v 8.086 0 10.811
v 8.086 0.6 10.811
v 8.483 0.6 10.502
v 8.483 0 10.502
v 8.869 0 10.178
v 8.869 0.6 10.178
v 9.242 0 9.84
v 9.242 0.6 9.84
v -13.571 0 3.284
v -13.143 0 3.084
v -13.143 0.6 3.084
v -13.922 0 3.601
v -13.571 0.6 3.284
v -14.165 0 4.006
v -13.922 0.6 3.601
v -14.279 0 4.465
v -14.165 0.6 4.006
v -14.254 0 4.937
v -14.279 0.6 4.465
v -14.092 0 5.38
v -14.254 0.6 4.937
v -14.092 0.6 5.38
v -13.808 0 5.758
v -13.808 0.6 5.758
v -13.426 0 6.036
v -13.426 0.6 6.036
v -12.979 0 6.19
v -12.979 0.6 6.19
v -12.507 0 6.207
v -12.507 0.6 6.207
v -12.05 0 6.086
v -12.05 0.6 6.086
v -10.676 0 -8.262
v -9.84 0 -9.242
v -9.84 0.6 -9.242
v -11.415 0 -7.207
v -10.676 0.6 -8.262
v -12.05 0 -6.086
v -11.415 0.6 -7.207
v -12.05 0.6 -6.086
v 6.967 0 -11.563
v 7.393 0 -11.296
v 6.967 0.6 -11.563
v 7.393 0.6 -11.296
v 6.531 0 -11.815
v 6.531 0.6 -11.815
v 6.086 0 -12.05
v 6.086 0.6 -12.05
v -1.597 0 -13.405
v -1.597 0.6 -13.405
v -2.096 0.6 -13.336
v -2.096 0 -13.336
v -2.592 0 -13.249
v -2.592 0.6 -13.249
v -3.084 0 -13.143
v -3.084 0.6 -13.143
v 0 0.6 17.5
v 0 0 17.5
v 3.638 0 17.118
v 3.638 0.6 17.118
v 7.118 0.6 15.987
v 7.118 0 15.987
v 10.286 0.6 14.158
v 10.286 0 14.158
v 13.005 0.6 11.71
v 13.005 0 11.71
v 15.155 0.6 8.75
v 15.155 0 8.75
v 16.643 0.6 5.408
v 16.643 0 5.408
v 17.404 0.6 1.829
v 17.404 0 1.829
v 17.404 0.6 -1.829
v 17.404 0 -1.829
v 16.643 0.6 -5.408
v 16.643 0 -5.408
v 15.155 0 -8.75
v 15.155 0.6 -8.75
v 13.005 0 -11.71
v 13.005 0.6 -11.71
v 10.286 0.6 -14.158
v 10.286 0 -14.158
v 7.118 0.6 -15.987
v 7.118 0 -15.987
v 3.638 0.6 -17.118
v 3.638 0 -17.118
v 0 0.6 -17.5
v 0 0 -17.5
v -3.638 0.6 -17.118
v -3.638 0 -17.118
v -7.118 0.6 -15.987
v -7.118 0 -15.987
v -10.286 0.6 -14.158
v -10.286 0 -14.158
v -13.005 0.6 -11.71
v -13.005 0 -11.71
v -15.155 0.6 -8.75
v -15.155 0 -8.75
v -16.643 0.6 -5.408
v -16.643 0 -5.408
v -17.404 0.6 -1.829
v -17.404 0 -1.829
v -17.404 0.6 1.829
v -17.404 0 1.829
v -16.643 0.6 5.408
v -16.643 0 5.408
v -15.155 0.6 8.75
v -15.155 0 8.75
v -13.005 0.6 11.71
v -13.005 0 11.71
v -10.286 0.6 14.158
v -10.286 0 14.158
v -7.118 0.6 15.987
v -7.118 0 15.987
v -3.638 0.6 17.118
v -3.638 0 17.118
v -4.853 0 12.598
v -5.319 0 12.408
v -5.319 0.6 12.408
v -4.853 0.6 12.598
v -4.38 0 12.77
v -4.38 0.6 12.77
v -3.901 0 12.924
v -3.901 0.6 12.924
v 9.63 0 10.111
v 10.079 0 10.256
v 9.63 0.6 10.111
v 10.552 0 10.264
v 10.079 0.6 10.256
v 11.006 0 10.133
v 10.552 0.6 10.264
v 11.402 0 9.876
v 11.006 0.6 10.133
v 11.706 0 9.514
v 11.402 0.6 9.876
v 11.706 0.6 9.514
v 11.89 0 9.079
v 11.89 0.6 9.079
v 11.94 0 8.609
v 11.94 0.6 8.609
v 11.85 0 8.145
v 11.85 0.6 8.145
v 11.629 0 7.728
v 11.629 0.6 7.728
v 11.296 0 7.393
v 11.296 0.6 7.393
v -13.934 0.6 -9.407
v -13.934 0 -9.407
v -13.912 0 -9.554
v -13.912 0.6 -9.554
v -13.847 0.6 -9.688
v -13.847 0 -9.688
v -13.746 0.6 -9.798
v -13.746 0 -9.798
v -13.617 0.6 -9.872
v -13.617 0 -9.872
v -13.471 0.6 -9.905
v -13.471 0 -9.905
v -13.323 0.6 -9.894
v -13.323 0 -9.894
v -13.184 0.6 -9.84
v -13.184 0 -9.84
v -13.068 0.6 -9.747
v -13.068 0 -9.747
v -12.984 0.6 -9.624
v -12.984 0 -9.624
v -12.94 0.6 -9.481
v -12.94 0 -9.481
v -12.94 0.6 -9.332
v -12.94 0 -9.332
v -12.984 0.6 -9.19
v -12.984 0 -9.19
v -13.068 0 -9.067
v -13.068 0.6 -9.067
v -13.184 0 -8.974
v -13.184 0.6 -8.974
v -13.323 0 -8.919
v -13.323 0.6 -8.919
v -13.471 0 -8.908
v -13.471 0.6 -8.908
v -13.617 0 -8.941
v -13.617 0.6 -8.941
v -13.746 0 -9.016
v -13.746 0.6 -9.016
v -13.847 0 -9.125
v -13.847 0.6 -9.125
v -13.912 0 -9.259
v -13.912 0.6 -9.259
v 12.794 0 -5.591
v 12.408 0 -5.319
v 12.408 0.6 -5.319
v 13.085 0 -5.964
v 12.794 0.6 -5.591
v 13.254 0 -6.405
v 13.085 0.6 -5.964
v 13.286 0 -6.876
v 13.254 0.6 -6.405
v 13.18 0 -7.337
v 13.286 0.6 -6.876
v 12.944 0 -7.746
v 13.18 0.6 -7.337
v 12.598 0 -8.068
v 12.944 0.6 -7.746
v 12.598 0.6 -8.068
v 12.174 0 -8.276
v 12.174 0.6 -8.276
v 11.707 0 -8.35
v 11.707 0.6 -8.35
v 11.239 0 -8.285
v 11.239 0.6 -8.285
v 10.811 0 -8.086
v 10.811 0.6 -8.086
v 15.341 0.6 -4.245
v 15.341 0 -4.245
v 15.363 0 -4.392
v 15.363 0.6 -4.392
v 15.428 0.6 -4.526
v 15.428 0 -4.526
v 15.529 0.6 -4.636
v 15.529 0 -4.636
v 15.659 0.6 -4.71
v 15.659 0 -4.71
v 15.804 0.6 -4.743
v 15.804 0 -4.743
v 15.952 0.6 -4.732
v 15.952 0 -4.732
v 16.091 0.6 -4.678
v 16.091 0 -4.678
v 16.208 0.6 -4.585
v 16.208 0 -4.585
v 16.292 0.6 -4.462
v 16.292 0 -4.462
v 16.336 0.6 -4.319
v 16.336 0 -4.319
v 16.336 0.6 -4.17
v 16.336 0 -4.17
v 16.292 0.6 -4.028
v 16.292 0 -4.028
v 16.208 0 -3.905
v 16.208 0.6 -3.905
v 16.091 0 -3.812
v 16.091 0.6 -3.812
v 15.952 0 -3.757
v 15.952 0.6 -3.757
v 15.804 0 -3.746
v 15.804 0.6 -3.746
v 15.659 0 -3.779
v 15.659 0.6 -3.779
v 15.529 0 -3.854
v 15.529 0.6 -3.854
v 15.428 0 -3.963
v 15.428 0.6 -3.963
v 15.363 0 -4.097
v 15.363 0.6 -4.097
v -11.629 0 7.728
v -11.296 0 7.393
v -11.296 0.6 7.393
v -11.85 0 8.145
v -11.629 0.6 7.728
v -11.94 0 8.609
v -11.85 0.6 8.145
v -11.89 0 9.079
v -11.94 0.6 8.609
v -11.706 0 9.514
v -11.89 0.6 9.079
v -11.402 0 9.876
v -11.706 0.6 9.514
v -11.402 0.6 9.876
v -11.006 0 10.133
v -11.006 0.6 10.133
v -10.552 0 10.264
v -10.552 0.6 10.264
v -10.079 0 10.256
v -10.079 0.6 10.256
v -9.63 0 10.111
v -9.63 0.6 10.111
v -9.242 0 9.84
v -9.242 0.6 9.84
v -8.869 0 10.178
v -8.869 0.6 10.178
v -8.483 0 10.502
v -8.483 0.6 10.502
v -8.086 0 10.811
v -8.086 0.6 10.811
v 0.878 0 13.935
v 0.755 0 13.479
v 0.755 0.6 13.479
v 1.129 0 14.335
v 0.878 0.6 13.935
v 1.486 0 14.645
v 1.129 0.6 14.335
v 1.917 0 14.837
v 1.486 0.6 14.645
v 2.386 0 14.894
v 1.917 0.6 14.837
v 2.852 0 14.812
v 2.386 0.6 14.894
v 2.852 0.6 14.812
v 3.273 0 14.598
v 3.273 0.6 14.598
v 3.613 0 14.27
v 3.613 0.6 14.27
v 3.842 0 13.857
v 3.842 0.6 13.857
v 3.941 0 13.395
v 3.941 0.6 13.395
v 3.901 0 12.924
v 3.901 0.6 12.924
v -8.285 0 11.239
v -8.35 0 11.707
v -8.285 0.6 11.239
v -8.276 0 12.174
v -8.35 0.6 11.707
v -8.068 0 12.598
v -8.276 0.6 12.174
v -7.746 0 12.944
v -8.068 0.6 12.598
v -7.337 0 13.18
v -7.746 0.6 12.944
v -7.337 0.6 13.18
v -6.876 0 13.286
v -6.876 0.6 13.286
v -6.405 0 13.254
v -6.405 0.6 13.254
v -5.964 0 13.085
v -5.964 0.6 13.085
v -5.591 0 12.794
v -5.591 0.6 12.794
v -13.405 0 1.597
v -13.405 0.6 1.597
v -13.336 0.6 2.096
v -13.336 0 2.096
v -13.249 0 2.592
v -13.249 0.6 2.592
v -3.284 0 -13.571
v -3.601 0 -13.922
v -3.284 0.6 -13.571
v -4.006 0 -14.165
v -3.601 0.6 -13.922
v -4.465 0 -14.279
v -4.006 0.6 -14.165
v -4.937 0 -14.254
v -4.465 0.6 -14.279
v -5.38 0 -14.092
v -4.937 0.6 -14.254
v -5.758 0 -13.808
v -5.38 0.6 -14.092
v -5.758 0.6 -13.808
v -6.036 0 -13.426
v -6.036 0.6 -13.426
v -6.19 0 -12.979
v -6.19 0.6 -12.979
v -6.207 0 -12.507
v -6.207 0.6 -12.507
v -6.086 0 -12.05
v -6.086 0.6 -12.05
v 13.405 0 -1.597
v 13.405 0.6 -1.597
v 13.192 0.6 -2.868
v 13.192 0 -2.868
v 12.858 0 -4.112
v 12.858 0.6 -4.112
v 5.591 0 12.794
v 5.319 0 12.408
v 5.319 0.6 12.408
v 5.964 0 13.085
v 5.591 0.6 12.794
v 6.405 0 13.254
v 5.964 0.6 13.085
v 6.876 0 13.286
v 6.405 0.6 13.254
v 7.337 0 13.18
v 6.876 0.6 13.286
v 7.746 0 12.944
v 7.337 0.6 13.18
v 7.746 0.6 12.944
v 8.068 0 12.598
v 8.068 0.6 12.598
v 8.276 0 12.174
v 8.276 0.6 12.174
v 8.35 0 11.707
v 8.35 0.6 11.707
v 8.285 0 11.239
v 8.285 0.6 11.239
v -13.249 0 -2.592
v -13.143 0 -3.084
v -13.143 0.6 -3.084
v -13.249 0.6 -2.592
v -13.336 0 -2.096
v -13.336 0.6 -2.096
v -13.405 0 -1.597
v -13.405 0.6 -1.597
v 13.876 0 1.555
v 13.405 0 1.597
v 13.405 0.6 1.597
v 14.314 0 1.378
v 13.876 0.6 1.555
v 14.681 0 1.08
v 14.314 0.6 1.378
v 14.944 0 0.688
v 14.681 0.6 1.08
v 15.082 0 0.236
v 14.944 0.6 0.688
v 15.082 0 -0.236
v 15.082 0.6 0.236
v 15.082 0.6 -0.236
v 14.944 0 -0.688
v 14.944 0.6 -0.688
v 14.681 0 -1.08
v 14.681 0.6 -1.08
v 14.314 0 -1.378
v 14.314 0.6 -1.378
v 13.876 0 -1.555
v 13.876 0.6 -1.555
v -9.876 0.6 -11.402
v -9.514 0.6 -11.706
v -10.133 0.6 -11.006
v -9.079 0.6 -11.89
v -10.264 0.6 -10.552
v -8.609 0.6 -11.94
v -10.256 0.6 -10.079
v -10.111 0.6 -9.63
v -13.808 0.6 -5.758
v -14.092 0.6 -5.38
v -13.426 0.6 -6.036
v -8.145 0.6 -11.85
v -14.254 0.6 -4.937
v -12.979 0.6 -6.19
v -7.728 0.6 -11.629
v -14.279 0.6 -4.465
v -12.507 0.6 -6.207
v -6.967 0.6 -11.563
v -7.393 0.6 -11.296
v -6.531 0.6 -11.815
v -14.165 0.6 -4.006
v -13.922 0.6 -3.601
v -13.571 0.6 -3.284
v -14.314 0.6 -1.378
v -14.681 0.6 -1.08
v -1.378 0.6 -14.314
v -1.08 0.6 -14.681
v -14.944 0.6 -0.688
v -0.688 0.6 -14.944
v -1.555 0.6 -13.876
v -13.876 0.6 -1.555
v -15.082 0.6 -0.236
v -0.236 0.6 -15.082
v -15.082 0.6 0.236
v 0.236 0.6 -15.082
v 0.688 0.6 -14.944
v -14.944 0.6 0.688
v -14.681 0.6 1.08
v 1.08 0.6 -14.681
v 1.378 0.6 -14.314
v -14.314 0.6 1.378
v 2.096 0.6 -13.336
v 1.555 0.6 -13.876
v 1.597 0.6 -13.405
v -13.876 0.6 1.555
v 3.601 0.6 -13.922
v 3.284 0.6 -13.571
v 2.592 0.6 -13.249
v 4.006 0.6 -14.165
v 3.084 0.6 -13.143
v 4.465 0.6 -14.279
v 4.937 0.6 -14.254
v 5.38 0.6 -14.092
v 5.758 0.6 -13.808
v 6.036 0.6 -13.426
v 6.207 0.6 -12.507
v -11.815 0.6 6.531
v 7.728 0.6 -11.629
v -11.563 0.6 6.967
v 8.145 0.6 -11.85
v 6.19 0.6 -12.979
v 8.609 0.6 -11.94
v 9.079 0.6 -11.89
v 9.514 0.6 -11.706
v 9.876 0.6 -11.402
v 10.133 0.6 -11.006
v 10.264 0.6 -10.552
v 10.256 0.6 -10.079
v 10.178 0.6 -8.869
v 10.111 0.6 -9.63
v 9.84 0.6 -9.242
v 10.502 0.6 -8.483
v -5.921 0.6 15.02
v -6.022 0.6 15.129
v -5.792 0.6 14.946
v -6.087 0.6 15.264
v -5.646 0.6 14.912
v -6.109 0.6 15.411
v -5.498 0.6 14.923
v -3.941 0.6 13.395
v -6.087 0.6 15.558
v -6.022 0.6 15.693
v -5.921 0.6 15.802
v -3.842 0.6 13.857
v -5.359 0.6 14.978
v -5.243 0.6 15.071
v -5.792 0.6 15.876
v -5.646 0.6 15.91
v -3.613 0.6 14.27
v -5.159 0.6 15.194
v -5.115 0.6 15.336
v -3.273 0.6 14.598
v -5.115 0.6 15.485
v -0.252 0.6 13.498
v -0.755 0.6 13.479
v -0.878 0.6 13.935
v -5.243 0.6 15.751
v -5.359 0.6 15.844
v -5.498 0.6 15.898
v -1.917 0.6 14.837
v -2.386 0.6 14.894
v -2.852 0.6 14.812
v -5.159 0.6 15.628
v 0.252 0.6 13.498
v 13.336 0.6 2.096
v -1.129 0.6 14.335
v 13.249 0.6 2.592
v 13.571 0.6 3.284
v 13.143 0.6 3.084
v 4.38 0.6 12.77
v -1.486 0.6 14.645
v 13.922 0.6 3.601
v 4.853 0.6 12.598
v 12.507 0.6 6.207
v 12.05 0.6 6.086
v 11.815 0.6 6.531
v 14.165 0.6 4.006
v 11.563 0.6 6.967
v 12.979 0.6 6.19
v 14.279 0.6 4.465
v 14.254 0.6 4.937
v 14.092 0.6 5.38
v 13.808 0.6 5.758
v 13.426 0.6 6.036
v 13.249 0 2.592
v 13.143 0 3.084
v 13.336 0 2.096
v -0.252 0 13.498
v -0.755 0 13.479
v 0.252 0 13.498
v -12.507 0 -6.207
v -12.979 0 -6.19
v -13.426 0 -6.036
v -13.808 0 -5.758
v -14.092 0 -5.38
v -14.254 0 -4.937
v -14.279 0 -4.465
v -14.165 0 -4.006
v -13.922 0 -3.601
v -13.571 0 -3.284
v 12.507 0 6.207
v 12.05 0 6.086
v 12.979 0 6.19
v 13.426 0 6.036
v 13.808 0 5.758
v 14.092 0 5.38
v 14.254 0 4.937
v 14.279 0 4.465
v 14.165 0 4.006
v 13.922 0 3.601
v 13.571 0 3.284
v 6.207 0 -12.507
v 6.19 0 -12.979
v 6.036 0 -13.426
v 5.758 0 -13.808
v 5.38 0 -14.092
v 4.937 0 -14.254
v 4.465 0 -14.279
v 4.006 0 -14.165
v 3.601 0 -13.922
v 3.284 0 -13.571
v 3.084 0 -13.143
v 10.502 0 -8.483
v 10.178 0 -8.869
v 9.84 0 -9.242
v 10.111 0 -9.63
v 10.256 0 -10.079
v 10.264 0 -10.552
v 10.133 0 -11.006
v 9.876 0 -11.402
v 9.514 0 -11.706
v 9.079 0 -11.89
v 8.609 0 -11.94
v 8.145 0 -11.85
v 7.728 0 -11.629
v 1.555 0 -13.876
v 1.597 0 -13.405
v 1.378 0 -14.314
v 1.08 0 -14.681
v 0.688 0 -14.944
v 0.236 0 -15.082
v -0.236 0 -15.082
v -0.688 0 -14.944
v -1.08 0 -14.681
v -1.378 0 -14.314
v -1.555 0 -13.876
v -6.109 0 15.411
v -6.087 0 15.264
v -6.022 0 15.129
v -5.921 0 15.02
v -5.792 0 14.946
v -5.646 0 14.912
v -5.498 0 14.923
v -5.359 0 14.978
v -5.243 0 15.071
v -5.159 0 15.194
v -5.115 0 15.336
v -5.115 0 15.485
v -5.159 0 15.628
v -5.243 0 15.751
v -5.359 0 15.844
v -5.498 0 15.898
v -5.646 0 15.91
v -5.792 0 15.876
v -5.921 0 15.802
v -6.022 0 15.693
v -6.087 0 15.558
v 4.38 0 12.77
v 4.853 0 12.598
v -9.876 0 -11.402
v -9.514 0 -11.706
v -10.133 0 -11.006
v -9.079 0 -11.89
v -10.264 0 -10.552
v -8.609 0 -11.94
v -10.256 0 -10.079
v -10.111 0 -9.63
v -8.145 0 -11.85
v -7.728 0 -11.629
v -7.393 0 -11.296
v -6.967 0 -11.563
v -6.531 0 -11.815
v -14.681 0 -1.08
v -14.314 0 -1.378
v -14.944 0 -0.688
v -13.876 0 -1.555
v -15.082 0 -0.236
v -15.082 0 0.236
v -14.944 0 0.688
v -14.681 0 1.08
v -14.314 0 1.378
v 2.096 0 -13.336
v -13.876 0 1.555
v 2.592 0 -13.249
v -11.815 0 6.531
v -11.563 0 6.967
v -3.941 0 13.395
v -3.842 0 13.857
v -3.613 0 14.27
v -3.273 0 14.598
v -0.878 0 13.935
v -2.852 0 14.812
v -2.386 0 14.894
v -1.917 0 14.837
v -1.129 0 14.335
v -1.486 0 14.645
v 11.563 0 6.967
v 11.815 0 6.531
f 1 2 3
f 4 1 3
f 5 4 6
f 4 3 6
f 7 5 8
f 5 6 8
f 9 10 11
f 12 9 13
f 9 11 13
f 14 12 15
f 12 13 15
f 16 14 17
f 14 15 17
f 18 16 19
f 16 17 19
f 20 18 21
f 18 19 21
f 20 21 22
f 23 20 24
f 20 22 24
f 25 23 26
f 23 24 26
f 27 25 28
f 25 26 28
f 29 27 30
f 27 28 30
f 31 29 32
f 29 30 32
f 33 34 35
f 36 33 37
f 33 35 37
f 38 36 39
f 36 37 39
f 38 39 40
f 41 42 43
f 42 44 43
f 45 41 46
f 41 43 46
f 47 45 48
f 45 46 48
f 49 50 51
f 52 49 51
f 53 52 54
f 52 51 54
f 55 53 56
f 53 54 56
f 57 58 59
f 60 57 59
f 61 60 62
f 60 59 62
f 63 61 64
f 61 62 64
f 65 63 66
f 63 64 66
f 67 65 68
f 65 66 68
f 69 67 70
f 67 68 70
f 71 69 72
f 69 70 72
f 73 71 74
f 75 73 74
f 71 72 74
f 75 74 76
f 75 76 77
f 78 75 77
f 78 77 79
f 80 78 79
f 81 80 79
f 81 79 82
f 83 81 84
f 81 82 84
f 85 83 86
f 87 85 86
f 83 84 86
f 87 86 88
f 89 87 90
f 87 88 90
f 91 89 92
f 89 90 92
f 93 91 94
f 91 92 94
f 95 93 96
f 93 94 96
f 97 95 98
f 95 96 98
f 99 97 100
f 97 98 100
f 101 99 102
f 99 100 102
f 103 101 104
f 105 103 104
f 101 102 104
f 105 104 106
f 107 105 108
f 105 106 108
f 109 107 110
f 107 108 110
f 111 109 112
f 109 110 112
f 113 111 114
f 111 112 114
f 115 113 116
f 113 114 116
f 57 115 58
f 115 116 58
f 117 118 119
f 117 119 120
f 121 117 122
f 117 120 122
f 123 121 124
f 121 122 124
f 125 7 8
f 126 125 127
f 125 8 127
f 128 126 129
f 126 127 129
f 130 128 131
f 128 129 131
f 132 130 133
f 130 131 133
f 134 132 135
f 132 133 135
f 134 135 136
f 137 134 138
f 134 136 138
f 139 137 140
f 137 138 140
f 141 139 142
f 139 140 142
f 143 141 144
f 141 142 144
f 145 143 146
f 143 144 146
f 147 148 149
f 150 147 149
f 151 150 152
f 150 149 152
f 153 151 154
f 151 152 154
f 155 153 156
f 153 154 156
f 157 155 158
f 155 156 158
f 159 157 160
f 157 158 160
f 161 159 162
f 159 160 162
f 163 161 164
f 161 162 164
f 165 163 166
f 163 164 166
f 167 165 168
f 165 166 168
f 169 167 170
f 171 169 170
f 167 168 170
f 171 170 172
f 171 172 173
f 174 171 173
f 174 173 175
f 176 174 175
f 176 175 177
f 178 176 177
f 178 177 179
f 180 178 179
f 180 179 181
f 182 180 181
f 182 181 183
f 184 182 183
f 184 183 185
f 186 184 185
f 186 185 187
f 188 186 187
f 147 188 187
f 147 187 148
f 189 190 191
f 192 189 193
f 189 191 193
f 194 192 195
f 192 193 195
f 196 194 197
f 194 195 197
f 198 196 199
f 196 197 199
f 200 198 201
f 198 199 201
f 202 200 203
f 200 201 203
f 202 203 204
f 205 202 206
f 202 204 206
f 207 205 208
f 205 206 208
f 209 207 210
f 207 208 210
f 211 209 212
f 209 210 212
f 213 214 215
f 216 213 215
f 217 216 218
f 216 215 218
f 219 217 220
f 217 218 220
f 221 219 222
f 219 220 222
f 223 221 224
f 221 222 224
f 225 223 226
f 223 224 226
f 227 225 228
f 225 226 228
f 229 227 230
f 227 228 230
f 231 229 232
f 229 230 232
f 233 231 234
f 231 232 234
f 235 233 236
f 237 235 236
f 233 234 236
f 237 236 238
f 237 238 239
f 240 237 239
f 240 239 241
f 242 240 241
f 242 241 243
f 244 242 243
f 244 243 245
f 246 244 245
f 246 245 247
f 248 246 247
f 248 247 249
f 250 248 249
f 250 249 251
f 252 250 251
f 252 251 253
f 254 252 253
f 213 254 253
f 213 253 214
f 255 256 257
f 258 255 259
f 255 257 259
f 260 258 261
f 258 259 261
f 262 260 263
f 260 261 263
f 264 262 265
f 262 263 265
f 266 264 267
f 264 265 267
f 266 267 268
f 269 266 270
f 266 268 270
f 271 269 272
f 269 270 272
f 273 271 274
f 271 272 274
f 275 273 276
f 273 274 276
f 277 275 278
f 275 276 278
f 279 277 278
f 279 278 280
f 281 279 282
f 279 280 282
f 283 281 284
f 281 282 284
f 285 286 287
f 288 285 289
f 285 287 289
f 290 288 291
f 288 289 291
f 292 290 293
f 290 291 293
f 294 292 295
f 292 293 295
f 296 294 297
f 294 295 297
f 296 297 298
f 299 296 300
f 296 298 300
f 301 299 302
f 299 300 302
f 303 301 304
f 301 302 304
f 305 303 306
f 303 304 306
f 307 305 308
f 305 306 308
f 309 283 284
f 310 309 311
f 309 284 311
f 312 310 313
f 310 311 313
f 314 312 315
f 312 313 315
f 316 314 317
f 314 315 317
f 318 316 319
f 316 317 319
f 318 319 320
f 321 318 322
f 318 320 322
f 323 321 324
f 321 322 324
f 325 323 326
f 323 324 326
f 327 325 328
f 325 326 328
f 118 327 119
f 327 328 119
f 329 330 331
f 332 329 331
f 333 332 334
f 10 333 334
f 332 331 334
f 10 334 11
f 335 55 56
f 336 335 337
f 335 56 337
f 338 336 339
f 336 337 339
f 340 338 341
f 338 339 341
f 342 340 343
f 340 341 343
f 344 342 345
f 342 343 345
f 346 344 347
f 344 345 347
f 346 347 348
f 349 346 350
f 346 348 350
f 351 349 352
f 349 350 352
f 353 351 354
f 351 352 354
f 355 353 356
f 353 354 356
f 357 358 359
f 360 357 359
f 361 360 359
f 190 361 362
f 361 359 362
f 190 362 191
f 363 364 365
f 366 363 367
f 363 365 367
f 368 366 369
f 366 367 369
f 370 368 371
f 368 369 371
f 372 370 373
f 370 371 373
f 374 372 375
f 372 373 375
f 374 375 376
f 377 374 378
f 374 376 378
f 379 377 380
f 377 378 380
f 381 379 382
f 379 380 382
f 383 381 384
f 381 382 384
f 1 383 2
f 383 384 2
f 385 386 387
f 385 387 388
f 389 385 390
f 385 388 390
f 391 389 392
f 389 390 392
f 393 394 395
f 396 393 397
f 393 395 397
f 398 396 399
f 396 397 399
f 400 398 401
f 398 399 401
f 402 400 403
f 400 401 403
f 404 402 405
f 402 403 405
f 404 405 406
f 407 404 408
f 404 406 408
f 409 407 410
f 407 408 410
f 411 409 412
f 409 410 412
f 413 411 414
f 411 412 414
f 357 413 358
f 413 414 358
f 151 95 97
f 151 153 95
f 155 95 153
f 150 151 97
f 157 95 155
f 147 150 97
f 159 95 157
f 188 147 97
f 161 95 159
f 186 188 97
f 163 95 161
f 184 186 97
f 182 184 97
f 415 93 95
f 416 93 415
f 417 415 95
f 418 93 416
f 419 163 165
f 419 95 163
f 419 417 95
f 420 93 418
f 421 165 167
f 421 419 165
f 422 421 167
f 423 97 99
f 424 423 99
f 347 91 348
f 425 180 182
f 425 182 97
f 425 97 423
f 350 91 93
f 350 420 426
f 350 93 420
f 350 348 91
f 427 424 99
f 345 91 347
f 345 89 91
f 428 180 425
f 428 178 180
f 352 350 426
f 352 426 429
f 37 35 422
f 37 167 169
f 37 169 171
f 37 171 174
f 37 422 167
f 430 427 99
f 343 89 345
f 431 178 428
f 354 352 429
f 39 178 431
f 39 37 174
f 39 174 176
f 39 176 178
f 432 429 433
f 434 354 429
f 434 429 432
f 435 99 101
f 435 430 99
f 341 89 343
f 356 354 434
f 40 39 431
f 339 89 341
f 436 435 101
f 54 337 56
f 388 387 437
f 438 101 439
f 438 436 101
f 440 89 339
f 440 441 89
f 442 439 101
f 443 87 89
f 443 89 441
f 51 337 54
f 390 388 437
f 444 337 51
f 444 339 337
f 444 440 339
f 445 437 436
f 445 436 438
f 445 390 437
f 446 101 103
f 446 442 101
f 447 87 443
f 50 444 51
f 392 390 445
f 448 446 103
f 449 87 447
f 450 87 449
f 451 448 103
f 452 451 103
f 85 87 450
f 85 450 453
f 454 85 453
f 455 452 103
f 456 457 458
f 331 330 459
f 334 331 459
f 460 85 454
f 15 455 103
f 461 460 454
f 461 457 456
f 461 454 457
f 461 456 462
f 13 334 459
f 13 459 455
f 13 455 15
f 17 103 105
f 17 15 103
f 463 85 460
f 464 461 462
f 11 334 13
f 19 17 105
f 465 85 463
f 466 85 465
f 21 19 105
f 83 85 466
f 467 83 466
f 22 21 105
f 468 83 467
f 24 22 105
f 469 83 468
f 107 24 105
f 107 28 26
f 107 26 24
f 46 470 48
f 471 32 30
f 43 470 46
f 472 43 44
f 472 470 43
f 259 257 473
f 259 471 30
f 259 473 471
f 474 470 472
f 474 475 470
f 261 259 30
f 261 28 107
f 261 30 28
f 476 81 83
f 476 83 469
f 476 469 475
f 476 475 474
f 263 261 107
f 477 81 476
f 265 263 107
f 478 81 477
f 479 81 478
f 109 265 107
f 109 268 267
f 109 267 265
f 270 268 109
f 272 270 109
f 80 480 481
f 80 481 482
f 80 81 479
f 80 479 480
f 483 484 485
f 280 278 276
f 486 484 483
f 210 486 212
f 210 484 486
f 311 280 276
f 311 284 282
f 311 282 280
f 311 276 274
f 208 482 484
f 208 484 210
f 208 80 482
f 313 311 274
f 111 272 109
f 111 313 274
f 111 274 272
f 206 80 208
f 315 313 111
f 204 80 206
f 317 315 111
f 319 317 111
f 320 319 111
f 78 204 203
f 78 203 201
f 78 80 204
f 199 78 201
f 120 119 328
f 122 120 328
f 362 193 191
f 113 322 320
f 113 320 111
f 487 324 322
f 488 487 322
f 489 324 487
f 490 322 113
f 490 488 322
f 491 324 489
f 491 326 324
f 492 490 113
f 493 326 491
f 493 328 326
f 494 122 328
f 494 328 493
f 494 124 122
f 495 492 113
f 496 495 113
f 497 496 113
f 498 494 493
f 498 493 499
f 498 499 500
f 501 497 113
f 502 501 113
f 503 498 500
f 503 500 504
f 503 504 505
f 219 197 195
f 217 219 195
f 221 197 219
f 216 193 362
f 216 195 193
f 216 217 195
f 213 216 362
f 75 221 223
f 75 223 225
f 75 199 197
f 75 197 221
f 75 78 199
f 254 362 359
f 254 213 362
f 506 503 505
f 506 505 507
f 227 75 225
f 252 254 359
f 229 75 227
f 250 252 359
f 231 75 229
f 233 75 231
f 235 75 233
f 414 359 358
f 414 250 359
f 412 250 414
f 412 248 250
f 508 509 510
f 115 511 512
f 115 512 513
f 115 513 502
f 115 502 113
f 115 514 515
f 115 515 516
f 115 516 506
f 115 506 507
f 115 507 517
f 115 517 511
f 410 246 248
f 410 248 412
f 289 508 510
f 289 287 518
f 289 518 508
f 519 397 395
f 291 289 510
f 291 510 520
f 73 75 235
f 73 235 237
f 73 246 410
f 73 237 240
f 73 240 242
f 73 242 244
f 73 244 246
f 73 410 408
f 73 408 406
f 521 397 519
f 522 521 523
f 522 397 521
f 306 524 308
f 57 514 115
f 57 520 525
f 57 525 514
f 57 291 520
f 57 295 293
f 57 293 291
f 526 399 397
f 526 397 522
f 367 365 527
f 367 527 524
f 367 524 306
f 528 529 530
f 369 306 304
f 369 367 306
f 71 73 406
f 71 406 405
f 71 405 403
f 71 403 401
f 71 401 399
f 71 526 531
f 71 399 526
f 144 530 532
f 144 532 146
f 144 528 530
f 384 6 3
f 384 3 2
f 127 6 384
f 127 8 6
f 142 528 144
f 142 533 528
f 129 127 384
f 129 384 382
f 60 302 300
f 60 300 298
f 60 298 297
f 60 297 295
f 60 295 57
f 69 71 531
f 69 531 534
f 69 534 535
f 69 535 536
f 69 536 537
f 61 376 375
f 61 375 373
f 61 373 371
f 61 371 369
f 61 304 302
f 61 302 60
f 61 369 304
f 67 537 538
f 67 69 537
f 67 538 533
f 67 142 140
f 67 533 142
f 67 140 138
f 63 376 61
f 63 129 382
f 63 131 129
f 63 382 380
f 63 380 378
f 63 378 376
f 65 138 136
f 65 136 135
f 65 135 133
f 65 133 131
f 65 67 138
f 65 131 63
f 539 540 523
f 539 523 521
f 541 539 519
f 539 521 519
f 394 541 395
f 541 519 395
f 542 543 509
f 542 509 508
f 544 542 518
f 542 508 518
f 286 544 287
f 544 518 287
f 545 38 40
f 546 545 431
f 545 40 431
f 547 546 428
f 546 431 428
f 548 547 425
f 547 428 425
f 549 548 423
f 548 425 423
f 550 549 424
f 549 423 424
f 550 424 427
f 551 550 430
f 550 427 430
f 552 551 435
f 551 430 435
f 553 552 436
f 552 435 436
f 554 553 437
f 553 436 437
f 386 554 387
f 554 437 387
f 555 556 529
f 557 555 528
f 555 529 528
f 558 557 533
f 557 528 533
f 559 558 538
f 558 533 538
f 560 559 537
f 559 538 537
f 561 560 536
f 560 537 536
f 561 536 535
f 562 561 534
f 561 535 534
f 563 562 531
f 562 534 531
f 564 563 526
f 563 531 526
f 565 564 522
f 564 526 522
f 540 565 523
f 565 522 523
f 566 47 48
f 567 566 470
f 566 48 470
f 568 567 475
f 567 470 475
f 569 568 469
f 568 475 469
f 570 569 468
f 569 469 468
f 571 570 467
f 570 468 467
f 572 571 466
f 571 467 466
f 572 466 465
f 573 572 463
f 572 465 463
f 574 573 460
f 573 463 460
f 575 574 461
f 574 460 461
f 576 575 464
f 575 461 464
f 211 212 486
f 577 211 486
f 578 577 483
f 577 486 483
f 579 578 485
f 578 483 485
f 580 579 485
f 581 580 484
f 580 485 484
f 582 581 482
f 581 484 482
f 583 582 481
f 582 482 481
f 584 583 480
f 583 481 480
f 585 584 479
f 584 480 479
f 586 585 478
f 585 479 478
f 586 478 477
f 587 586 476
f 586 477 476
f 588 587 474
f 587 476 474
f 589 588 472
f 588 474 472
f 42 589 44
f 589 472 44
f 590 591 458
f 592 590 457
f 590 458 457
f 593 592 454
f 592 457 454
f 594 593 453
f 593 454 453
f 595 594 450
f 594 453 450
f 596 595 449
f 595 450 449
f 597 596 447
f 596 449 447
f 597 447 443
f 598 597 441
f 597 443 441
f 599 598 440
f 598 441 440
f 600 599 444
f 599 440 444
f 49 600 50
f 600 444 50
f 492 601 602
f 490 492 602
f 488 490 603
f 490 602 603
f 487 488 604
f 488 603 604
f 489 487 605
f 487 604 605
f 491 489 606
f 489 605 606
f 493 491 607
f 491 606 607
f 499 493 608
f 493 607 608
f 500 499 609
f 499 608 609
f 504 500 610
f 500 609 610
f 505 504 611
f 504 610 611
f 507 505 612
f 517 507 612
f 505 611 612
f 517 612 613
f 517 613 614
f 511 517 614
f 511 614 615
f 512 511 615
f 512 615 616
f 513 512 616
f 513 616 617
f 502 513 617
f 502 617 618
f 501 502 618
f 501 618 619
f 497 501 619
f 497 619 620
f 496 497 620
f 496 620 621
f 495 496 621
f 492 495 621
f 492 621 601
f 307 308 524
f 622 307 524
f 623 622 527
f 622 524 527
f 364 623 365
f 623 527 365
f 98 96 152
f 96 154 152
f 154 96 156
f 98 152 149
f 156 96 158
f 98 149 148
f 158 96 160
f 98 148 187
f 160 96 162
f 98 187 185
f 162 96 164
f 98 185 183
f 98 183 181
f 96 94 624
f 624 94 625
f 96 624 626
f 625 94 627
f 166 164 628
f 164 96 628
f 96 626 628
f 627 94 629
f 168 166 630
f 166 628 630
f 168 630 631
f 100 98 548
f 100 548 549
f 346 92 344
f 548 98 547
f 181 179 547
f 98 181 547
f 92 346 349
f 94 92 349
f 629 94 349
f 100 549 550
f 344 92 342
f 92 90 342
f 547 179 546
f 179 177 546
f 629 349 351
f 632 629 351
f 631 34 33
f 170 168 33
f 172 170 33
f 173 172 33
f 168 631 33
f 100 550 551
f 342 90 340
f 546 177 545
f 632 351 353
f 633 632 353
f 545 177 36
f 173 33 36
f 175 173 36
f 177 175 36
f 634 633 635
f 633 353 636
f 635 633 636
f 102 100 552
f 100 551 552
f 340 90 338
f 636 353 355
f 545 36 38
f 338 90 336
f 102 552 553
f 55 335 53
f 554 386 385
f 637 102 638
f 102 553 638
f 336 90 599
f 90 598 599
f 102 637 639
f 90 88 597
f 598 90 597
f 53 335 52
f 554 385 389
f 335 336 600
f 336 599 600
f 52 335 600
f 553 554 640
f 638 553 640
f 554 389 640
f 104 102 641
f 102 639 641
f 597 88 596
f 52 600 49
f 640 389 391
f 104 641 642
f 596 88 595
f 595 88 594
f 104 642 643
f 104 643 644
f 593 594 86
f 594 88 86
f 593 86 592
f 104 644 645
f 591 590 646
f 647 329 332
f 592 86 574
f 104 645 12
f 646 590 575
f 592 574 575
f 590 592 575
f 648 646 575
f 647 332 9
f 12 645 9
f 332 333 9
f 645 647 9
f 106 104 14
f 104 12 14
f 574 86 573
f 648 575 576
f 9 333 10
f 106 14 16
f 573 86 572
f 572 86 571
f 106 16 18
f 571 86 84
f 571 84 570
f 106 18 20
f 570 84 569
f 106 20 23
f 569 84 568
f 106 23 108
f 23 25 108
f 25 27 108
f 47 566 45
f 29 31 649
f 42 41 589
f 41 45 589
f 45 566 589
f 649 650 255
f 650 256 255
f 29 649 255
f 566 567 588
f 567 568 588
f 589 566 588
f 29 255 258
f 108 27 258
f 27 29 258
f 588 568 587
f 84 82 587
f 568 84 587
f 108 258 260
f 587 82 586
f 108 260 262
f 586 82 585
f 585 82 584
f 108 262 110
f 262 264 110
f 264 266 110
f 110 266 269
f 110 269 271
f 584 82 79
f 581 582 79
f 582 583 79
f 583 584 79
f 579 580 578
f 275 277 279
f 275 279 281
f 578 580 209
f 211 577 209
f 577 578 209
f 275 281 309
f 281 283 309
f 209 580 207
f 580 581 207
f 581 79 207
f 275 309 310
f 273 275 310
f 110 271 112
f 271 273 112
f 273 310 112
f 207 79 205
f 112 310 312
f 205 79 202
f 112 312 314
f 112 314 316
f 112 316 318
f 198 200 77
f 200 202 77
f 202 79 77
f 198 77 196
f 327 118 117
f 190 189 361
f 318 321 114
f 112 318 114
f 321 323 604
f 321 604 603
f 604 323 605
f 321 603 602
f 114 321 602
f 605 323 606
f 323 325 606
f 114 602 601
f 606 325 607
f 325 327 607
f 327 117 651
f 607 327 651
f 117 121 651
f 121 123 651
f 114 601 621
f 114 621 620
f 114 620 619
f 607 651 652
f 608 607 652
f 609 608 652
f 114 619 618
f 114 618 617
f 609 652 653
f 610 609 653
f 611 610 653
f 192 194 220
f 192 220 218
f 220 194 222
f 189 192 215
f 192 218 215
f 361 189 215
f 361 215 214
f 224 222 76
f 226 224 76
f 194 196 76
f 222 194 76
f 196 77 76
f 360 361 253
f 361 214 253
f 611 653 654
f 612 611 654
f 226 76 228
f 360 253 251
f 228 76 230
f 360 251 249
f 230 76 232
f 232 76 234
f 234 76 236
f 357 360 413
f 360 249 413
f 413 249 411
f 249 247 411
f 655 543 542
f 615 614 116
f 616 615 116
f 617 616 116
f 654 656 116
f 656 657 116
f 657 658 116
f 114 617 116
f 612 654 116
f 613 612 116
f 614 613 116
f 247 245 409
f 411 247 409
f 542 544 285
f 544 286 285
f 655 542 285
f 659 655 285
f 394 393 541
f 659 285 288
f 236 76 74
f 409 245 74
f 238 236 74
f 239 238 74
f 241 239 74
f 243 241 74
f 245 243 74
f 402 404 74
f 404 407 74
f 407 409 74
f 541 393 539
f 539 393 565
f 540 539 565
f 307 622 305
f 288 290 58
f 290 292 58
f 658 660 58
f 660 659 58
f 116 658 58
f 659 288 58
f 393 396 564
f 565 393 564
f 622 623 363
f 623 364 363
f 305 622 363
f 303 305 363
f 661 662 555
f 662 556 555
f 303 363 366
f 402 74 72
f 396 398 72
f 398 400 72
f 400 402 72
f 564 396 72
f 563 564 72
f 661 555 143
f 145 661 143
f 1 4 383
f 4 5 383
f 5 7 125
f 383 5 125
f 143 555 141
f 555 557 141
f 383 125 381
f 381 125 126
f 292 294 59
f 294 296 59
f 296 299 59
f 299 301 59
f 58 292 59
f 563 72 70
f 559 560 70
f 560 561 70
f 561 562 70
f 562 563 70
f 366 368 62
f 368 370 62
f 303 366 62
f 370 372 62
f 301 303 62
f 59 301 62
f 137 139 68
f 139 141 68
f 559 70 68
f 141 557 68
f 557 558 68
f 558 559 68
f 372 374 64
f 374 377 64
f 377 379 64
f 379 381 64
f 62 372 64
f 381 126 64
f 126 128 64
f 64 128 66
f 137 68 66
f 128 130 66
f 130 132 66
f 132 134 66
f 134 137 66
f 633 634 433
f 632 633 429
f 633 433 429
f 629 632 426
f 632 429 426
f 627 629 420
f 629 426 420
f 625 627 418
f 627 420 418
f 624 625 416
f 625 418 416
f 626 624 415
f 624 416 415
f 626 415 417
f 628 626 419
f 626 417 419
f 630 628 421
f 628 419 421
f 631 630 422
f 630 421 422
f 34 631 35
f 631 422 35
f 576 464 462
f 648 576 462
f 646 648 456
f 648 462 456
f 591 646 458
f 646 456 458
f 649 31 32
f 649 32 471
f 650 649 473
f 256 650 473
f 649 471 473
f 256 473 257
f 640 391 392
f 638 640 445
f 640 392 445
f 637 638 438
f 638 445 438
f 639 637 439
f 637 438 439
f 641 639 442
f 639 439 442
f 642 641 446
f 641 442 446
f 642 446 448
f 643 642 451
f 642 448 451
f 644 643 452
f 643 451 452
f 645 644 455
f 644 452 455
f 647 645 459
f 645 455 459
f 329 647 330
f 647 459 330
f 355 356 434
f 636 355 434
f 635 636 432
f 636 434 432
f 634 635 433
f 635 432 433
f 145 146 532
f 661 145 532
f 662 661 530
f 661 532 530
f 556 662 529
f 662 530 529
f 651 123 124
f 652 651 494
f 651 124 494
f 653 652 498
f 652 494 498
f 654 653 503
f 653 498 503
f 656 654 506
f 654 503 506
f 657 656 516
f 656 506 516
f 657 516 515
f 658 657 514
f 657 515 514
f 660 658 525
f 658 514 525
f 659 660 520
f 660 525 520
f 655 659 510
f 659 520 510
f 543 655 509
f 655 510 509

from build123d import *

# Parameters (mm, degrees)
SKETCH1_R                = 17.5
BOSS_EXTRUDE1_DEPTH      = 0.6
CUT_EXTRUDE1_REACH       = 26.756
SKETCH2_R                = 13.5
CUT_EXTRUDE2_REACH       = 26.756
SKETCH3_R                = 1.6
CIRPATTERN1_COUNT        = 6
CIRPATTERN1_ANGLE        = 100
CUT_EXTRUDE3_REACH       = 26.756
SKETCH4_R                = 1.6
CIRPATTERN2_COUNT        = 11
CIRPATTERN2_ANGLE        = 200
F_1_0_1_DIAMETER_HOLE1_D = 1


with BuildPart() as part:
    # Sketch1 → Boss-Extrude1 (new body)
    with BuildSketch(Plane(origin=(0, 0, 0), x_dir=(1, 0, 0), z_dir=(0, 1, 0))):
        with Locations(Location((0, 0, 0), (0, 0, 270))):
            Circle(SKETCH1_R)
    extrude(amount=BOSS_EXTRUDE1_DEPTH)

    # Sketch2 → Cut-Extrude1 (cut, up to next)
    with BuildSketch(Plane(origin=(0, 0.6, 0), x_dir=(1, 0, 0), z_dir=(0, 1, 0)), mode=Mode.PRIVATE) as cut_extrude1_sk1:
        with Locations(Location((0, 0, 0), (0, 0, 270))):
            Circle(SKETCH2_R)
    cut_extrude1_tool1 = extrude(cut_extrude1_sk1.sketch, amount=-CUT_EXTRUDE1_REACH, mode=Mode.PRIVATE) & part.part
    add(cut_extrude1_tool1.solids().sort_by_distance((0, 0.6, 0))[0], mode=Mode.SUBTRACT)

    # Sketch3 → Cut-Extrude2 (cut, up to next)
    with BuildSketch(Plane(origin=(0, 0.6, 0), x_dir=(1, 0, 0), z_dir=(0, 1, 0)), mode=Mode.PRIVATE) as cut_extrude2_sk1:
        with Locations((11.691342951, 6.75)):
            Circle(SKETCH3_R)
    cut_extrude2_tool1 = extrude(cut_extrude2_sk1.sketch, amount=-CUT_EXTRUDE2_REACH, mode=Mode.PRIVATE) & part.part
    cut_extrude2 = cut_extrude2_tool1.solids().sort_by_distance((11.691343, 0.6, -6.75))[0]
    add(cut_extrude2, mode=Mode.SUBTRACT)

    # CirPattern1: Cut-Extrude2 ×6 about axis
    cirpattern1_axis = Axis((0, 0, 0), (0, 1, 0))
    for i in range(1, CIRPATTERN1_COUNT):
        add(cut_extrude2.rotate(cirpattern1_axis, i * CIRPATTERN1_ANGLE / (CIRPATTERN1_COUNT - 1)), mode=Mode.SUBTRACT)

    # Sketch4 → Cut-Extrude3 (cut, up to next)
    with BuildSketch(Plane(origin=(0, 0.6, 0), x_dir=(1, 0, 0), z_dir=(0, 1, 0)), mode=Mode.PRIVATE) as cut_extrude3_sk1:
        with Locations((13.5, 0)):
            Circle(SKETCH4_R)
    cut_extrude3_tool1 = extrude(cut_extrude3_sk1.sketch, amount=-CUT_EXTRUDE3_REACH, mode=Mode.PRIVATE) & part.part
    cut_extrude3 = cut_extrude3_tool1.solids().sort_by_distance((13.5, 0.6, 0))[0]
    add(cut_extrude3, mode=Mode.SUBTRACT)

    # CirPattern2: Cut-Extrude3 ×11 about axis
    cirpattern2_axis = Axis((0, 0, 0), (0, -1, 0))
    for i in range(1, CIRPATTERN2_COUNT):
        add(cut_extrude3.rotate(cirpattern2_axis, i * CIRPATTERN2_ANGLE / (CIRPATTERN2_COUNT - 1)), mode=Mode.SUBTRACT)

    # Ø1.0 (1) Diameter Hole1 (through all)
    with Locations(Plane(origin=(0, 0.6, 0), x_dir=(1, 0, 0), z_dir=(0, 1, 0))):
        with Locations((15.841183551, 4.24463234), (-13.434093526, 9.406653556), (-5.609130351, -15.410958981)):
            Hole(F_1_0_1_DIAMETER_HOLE1_D / 2)


solid = part.part
